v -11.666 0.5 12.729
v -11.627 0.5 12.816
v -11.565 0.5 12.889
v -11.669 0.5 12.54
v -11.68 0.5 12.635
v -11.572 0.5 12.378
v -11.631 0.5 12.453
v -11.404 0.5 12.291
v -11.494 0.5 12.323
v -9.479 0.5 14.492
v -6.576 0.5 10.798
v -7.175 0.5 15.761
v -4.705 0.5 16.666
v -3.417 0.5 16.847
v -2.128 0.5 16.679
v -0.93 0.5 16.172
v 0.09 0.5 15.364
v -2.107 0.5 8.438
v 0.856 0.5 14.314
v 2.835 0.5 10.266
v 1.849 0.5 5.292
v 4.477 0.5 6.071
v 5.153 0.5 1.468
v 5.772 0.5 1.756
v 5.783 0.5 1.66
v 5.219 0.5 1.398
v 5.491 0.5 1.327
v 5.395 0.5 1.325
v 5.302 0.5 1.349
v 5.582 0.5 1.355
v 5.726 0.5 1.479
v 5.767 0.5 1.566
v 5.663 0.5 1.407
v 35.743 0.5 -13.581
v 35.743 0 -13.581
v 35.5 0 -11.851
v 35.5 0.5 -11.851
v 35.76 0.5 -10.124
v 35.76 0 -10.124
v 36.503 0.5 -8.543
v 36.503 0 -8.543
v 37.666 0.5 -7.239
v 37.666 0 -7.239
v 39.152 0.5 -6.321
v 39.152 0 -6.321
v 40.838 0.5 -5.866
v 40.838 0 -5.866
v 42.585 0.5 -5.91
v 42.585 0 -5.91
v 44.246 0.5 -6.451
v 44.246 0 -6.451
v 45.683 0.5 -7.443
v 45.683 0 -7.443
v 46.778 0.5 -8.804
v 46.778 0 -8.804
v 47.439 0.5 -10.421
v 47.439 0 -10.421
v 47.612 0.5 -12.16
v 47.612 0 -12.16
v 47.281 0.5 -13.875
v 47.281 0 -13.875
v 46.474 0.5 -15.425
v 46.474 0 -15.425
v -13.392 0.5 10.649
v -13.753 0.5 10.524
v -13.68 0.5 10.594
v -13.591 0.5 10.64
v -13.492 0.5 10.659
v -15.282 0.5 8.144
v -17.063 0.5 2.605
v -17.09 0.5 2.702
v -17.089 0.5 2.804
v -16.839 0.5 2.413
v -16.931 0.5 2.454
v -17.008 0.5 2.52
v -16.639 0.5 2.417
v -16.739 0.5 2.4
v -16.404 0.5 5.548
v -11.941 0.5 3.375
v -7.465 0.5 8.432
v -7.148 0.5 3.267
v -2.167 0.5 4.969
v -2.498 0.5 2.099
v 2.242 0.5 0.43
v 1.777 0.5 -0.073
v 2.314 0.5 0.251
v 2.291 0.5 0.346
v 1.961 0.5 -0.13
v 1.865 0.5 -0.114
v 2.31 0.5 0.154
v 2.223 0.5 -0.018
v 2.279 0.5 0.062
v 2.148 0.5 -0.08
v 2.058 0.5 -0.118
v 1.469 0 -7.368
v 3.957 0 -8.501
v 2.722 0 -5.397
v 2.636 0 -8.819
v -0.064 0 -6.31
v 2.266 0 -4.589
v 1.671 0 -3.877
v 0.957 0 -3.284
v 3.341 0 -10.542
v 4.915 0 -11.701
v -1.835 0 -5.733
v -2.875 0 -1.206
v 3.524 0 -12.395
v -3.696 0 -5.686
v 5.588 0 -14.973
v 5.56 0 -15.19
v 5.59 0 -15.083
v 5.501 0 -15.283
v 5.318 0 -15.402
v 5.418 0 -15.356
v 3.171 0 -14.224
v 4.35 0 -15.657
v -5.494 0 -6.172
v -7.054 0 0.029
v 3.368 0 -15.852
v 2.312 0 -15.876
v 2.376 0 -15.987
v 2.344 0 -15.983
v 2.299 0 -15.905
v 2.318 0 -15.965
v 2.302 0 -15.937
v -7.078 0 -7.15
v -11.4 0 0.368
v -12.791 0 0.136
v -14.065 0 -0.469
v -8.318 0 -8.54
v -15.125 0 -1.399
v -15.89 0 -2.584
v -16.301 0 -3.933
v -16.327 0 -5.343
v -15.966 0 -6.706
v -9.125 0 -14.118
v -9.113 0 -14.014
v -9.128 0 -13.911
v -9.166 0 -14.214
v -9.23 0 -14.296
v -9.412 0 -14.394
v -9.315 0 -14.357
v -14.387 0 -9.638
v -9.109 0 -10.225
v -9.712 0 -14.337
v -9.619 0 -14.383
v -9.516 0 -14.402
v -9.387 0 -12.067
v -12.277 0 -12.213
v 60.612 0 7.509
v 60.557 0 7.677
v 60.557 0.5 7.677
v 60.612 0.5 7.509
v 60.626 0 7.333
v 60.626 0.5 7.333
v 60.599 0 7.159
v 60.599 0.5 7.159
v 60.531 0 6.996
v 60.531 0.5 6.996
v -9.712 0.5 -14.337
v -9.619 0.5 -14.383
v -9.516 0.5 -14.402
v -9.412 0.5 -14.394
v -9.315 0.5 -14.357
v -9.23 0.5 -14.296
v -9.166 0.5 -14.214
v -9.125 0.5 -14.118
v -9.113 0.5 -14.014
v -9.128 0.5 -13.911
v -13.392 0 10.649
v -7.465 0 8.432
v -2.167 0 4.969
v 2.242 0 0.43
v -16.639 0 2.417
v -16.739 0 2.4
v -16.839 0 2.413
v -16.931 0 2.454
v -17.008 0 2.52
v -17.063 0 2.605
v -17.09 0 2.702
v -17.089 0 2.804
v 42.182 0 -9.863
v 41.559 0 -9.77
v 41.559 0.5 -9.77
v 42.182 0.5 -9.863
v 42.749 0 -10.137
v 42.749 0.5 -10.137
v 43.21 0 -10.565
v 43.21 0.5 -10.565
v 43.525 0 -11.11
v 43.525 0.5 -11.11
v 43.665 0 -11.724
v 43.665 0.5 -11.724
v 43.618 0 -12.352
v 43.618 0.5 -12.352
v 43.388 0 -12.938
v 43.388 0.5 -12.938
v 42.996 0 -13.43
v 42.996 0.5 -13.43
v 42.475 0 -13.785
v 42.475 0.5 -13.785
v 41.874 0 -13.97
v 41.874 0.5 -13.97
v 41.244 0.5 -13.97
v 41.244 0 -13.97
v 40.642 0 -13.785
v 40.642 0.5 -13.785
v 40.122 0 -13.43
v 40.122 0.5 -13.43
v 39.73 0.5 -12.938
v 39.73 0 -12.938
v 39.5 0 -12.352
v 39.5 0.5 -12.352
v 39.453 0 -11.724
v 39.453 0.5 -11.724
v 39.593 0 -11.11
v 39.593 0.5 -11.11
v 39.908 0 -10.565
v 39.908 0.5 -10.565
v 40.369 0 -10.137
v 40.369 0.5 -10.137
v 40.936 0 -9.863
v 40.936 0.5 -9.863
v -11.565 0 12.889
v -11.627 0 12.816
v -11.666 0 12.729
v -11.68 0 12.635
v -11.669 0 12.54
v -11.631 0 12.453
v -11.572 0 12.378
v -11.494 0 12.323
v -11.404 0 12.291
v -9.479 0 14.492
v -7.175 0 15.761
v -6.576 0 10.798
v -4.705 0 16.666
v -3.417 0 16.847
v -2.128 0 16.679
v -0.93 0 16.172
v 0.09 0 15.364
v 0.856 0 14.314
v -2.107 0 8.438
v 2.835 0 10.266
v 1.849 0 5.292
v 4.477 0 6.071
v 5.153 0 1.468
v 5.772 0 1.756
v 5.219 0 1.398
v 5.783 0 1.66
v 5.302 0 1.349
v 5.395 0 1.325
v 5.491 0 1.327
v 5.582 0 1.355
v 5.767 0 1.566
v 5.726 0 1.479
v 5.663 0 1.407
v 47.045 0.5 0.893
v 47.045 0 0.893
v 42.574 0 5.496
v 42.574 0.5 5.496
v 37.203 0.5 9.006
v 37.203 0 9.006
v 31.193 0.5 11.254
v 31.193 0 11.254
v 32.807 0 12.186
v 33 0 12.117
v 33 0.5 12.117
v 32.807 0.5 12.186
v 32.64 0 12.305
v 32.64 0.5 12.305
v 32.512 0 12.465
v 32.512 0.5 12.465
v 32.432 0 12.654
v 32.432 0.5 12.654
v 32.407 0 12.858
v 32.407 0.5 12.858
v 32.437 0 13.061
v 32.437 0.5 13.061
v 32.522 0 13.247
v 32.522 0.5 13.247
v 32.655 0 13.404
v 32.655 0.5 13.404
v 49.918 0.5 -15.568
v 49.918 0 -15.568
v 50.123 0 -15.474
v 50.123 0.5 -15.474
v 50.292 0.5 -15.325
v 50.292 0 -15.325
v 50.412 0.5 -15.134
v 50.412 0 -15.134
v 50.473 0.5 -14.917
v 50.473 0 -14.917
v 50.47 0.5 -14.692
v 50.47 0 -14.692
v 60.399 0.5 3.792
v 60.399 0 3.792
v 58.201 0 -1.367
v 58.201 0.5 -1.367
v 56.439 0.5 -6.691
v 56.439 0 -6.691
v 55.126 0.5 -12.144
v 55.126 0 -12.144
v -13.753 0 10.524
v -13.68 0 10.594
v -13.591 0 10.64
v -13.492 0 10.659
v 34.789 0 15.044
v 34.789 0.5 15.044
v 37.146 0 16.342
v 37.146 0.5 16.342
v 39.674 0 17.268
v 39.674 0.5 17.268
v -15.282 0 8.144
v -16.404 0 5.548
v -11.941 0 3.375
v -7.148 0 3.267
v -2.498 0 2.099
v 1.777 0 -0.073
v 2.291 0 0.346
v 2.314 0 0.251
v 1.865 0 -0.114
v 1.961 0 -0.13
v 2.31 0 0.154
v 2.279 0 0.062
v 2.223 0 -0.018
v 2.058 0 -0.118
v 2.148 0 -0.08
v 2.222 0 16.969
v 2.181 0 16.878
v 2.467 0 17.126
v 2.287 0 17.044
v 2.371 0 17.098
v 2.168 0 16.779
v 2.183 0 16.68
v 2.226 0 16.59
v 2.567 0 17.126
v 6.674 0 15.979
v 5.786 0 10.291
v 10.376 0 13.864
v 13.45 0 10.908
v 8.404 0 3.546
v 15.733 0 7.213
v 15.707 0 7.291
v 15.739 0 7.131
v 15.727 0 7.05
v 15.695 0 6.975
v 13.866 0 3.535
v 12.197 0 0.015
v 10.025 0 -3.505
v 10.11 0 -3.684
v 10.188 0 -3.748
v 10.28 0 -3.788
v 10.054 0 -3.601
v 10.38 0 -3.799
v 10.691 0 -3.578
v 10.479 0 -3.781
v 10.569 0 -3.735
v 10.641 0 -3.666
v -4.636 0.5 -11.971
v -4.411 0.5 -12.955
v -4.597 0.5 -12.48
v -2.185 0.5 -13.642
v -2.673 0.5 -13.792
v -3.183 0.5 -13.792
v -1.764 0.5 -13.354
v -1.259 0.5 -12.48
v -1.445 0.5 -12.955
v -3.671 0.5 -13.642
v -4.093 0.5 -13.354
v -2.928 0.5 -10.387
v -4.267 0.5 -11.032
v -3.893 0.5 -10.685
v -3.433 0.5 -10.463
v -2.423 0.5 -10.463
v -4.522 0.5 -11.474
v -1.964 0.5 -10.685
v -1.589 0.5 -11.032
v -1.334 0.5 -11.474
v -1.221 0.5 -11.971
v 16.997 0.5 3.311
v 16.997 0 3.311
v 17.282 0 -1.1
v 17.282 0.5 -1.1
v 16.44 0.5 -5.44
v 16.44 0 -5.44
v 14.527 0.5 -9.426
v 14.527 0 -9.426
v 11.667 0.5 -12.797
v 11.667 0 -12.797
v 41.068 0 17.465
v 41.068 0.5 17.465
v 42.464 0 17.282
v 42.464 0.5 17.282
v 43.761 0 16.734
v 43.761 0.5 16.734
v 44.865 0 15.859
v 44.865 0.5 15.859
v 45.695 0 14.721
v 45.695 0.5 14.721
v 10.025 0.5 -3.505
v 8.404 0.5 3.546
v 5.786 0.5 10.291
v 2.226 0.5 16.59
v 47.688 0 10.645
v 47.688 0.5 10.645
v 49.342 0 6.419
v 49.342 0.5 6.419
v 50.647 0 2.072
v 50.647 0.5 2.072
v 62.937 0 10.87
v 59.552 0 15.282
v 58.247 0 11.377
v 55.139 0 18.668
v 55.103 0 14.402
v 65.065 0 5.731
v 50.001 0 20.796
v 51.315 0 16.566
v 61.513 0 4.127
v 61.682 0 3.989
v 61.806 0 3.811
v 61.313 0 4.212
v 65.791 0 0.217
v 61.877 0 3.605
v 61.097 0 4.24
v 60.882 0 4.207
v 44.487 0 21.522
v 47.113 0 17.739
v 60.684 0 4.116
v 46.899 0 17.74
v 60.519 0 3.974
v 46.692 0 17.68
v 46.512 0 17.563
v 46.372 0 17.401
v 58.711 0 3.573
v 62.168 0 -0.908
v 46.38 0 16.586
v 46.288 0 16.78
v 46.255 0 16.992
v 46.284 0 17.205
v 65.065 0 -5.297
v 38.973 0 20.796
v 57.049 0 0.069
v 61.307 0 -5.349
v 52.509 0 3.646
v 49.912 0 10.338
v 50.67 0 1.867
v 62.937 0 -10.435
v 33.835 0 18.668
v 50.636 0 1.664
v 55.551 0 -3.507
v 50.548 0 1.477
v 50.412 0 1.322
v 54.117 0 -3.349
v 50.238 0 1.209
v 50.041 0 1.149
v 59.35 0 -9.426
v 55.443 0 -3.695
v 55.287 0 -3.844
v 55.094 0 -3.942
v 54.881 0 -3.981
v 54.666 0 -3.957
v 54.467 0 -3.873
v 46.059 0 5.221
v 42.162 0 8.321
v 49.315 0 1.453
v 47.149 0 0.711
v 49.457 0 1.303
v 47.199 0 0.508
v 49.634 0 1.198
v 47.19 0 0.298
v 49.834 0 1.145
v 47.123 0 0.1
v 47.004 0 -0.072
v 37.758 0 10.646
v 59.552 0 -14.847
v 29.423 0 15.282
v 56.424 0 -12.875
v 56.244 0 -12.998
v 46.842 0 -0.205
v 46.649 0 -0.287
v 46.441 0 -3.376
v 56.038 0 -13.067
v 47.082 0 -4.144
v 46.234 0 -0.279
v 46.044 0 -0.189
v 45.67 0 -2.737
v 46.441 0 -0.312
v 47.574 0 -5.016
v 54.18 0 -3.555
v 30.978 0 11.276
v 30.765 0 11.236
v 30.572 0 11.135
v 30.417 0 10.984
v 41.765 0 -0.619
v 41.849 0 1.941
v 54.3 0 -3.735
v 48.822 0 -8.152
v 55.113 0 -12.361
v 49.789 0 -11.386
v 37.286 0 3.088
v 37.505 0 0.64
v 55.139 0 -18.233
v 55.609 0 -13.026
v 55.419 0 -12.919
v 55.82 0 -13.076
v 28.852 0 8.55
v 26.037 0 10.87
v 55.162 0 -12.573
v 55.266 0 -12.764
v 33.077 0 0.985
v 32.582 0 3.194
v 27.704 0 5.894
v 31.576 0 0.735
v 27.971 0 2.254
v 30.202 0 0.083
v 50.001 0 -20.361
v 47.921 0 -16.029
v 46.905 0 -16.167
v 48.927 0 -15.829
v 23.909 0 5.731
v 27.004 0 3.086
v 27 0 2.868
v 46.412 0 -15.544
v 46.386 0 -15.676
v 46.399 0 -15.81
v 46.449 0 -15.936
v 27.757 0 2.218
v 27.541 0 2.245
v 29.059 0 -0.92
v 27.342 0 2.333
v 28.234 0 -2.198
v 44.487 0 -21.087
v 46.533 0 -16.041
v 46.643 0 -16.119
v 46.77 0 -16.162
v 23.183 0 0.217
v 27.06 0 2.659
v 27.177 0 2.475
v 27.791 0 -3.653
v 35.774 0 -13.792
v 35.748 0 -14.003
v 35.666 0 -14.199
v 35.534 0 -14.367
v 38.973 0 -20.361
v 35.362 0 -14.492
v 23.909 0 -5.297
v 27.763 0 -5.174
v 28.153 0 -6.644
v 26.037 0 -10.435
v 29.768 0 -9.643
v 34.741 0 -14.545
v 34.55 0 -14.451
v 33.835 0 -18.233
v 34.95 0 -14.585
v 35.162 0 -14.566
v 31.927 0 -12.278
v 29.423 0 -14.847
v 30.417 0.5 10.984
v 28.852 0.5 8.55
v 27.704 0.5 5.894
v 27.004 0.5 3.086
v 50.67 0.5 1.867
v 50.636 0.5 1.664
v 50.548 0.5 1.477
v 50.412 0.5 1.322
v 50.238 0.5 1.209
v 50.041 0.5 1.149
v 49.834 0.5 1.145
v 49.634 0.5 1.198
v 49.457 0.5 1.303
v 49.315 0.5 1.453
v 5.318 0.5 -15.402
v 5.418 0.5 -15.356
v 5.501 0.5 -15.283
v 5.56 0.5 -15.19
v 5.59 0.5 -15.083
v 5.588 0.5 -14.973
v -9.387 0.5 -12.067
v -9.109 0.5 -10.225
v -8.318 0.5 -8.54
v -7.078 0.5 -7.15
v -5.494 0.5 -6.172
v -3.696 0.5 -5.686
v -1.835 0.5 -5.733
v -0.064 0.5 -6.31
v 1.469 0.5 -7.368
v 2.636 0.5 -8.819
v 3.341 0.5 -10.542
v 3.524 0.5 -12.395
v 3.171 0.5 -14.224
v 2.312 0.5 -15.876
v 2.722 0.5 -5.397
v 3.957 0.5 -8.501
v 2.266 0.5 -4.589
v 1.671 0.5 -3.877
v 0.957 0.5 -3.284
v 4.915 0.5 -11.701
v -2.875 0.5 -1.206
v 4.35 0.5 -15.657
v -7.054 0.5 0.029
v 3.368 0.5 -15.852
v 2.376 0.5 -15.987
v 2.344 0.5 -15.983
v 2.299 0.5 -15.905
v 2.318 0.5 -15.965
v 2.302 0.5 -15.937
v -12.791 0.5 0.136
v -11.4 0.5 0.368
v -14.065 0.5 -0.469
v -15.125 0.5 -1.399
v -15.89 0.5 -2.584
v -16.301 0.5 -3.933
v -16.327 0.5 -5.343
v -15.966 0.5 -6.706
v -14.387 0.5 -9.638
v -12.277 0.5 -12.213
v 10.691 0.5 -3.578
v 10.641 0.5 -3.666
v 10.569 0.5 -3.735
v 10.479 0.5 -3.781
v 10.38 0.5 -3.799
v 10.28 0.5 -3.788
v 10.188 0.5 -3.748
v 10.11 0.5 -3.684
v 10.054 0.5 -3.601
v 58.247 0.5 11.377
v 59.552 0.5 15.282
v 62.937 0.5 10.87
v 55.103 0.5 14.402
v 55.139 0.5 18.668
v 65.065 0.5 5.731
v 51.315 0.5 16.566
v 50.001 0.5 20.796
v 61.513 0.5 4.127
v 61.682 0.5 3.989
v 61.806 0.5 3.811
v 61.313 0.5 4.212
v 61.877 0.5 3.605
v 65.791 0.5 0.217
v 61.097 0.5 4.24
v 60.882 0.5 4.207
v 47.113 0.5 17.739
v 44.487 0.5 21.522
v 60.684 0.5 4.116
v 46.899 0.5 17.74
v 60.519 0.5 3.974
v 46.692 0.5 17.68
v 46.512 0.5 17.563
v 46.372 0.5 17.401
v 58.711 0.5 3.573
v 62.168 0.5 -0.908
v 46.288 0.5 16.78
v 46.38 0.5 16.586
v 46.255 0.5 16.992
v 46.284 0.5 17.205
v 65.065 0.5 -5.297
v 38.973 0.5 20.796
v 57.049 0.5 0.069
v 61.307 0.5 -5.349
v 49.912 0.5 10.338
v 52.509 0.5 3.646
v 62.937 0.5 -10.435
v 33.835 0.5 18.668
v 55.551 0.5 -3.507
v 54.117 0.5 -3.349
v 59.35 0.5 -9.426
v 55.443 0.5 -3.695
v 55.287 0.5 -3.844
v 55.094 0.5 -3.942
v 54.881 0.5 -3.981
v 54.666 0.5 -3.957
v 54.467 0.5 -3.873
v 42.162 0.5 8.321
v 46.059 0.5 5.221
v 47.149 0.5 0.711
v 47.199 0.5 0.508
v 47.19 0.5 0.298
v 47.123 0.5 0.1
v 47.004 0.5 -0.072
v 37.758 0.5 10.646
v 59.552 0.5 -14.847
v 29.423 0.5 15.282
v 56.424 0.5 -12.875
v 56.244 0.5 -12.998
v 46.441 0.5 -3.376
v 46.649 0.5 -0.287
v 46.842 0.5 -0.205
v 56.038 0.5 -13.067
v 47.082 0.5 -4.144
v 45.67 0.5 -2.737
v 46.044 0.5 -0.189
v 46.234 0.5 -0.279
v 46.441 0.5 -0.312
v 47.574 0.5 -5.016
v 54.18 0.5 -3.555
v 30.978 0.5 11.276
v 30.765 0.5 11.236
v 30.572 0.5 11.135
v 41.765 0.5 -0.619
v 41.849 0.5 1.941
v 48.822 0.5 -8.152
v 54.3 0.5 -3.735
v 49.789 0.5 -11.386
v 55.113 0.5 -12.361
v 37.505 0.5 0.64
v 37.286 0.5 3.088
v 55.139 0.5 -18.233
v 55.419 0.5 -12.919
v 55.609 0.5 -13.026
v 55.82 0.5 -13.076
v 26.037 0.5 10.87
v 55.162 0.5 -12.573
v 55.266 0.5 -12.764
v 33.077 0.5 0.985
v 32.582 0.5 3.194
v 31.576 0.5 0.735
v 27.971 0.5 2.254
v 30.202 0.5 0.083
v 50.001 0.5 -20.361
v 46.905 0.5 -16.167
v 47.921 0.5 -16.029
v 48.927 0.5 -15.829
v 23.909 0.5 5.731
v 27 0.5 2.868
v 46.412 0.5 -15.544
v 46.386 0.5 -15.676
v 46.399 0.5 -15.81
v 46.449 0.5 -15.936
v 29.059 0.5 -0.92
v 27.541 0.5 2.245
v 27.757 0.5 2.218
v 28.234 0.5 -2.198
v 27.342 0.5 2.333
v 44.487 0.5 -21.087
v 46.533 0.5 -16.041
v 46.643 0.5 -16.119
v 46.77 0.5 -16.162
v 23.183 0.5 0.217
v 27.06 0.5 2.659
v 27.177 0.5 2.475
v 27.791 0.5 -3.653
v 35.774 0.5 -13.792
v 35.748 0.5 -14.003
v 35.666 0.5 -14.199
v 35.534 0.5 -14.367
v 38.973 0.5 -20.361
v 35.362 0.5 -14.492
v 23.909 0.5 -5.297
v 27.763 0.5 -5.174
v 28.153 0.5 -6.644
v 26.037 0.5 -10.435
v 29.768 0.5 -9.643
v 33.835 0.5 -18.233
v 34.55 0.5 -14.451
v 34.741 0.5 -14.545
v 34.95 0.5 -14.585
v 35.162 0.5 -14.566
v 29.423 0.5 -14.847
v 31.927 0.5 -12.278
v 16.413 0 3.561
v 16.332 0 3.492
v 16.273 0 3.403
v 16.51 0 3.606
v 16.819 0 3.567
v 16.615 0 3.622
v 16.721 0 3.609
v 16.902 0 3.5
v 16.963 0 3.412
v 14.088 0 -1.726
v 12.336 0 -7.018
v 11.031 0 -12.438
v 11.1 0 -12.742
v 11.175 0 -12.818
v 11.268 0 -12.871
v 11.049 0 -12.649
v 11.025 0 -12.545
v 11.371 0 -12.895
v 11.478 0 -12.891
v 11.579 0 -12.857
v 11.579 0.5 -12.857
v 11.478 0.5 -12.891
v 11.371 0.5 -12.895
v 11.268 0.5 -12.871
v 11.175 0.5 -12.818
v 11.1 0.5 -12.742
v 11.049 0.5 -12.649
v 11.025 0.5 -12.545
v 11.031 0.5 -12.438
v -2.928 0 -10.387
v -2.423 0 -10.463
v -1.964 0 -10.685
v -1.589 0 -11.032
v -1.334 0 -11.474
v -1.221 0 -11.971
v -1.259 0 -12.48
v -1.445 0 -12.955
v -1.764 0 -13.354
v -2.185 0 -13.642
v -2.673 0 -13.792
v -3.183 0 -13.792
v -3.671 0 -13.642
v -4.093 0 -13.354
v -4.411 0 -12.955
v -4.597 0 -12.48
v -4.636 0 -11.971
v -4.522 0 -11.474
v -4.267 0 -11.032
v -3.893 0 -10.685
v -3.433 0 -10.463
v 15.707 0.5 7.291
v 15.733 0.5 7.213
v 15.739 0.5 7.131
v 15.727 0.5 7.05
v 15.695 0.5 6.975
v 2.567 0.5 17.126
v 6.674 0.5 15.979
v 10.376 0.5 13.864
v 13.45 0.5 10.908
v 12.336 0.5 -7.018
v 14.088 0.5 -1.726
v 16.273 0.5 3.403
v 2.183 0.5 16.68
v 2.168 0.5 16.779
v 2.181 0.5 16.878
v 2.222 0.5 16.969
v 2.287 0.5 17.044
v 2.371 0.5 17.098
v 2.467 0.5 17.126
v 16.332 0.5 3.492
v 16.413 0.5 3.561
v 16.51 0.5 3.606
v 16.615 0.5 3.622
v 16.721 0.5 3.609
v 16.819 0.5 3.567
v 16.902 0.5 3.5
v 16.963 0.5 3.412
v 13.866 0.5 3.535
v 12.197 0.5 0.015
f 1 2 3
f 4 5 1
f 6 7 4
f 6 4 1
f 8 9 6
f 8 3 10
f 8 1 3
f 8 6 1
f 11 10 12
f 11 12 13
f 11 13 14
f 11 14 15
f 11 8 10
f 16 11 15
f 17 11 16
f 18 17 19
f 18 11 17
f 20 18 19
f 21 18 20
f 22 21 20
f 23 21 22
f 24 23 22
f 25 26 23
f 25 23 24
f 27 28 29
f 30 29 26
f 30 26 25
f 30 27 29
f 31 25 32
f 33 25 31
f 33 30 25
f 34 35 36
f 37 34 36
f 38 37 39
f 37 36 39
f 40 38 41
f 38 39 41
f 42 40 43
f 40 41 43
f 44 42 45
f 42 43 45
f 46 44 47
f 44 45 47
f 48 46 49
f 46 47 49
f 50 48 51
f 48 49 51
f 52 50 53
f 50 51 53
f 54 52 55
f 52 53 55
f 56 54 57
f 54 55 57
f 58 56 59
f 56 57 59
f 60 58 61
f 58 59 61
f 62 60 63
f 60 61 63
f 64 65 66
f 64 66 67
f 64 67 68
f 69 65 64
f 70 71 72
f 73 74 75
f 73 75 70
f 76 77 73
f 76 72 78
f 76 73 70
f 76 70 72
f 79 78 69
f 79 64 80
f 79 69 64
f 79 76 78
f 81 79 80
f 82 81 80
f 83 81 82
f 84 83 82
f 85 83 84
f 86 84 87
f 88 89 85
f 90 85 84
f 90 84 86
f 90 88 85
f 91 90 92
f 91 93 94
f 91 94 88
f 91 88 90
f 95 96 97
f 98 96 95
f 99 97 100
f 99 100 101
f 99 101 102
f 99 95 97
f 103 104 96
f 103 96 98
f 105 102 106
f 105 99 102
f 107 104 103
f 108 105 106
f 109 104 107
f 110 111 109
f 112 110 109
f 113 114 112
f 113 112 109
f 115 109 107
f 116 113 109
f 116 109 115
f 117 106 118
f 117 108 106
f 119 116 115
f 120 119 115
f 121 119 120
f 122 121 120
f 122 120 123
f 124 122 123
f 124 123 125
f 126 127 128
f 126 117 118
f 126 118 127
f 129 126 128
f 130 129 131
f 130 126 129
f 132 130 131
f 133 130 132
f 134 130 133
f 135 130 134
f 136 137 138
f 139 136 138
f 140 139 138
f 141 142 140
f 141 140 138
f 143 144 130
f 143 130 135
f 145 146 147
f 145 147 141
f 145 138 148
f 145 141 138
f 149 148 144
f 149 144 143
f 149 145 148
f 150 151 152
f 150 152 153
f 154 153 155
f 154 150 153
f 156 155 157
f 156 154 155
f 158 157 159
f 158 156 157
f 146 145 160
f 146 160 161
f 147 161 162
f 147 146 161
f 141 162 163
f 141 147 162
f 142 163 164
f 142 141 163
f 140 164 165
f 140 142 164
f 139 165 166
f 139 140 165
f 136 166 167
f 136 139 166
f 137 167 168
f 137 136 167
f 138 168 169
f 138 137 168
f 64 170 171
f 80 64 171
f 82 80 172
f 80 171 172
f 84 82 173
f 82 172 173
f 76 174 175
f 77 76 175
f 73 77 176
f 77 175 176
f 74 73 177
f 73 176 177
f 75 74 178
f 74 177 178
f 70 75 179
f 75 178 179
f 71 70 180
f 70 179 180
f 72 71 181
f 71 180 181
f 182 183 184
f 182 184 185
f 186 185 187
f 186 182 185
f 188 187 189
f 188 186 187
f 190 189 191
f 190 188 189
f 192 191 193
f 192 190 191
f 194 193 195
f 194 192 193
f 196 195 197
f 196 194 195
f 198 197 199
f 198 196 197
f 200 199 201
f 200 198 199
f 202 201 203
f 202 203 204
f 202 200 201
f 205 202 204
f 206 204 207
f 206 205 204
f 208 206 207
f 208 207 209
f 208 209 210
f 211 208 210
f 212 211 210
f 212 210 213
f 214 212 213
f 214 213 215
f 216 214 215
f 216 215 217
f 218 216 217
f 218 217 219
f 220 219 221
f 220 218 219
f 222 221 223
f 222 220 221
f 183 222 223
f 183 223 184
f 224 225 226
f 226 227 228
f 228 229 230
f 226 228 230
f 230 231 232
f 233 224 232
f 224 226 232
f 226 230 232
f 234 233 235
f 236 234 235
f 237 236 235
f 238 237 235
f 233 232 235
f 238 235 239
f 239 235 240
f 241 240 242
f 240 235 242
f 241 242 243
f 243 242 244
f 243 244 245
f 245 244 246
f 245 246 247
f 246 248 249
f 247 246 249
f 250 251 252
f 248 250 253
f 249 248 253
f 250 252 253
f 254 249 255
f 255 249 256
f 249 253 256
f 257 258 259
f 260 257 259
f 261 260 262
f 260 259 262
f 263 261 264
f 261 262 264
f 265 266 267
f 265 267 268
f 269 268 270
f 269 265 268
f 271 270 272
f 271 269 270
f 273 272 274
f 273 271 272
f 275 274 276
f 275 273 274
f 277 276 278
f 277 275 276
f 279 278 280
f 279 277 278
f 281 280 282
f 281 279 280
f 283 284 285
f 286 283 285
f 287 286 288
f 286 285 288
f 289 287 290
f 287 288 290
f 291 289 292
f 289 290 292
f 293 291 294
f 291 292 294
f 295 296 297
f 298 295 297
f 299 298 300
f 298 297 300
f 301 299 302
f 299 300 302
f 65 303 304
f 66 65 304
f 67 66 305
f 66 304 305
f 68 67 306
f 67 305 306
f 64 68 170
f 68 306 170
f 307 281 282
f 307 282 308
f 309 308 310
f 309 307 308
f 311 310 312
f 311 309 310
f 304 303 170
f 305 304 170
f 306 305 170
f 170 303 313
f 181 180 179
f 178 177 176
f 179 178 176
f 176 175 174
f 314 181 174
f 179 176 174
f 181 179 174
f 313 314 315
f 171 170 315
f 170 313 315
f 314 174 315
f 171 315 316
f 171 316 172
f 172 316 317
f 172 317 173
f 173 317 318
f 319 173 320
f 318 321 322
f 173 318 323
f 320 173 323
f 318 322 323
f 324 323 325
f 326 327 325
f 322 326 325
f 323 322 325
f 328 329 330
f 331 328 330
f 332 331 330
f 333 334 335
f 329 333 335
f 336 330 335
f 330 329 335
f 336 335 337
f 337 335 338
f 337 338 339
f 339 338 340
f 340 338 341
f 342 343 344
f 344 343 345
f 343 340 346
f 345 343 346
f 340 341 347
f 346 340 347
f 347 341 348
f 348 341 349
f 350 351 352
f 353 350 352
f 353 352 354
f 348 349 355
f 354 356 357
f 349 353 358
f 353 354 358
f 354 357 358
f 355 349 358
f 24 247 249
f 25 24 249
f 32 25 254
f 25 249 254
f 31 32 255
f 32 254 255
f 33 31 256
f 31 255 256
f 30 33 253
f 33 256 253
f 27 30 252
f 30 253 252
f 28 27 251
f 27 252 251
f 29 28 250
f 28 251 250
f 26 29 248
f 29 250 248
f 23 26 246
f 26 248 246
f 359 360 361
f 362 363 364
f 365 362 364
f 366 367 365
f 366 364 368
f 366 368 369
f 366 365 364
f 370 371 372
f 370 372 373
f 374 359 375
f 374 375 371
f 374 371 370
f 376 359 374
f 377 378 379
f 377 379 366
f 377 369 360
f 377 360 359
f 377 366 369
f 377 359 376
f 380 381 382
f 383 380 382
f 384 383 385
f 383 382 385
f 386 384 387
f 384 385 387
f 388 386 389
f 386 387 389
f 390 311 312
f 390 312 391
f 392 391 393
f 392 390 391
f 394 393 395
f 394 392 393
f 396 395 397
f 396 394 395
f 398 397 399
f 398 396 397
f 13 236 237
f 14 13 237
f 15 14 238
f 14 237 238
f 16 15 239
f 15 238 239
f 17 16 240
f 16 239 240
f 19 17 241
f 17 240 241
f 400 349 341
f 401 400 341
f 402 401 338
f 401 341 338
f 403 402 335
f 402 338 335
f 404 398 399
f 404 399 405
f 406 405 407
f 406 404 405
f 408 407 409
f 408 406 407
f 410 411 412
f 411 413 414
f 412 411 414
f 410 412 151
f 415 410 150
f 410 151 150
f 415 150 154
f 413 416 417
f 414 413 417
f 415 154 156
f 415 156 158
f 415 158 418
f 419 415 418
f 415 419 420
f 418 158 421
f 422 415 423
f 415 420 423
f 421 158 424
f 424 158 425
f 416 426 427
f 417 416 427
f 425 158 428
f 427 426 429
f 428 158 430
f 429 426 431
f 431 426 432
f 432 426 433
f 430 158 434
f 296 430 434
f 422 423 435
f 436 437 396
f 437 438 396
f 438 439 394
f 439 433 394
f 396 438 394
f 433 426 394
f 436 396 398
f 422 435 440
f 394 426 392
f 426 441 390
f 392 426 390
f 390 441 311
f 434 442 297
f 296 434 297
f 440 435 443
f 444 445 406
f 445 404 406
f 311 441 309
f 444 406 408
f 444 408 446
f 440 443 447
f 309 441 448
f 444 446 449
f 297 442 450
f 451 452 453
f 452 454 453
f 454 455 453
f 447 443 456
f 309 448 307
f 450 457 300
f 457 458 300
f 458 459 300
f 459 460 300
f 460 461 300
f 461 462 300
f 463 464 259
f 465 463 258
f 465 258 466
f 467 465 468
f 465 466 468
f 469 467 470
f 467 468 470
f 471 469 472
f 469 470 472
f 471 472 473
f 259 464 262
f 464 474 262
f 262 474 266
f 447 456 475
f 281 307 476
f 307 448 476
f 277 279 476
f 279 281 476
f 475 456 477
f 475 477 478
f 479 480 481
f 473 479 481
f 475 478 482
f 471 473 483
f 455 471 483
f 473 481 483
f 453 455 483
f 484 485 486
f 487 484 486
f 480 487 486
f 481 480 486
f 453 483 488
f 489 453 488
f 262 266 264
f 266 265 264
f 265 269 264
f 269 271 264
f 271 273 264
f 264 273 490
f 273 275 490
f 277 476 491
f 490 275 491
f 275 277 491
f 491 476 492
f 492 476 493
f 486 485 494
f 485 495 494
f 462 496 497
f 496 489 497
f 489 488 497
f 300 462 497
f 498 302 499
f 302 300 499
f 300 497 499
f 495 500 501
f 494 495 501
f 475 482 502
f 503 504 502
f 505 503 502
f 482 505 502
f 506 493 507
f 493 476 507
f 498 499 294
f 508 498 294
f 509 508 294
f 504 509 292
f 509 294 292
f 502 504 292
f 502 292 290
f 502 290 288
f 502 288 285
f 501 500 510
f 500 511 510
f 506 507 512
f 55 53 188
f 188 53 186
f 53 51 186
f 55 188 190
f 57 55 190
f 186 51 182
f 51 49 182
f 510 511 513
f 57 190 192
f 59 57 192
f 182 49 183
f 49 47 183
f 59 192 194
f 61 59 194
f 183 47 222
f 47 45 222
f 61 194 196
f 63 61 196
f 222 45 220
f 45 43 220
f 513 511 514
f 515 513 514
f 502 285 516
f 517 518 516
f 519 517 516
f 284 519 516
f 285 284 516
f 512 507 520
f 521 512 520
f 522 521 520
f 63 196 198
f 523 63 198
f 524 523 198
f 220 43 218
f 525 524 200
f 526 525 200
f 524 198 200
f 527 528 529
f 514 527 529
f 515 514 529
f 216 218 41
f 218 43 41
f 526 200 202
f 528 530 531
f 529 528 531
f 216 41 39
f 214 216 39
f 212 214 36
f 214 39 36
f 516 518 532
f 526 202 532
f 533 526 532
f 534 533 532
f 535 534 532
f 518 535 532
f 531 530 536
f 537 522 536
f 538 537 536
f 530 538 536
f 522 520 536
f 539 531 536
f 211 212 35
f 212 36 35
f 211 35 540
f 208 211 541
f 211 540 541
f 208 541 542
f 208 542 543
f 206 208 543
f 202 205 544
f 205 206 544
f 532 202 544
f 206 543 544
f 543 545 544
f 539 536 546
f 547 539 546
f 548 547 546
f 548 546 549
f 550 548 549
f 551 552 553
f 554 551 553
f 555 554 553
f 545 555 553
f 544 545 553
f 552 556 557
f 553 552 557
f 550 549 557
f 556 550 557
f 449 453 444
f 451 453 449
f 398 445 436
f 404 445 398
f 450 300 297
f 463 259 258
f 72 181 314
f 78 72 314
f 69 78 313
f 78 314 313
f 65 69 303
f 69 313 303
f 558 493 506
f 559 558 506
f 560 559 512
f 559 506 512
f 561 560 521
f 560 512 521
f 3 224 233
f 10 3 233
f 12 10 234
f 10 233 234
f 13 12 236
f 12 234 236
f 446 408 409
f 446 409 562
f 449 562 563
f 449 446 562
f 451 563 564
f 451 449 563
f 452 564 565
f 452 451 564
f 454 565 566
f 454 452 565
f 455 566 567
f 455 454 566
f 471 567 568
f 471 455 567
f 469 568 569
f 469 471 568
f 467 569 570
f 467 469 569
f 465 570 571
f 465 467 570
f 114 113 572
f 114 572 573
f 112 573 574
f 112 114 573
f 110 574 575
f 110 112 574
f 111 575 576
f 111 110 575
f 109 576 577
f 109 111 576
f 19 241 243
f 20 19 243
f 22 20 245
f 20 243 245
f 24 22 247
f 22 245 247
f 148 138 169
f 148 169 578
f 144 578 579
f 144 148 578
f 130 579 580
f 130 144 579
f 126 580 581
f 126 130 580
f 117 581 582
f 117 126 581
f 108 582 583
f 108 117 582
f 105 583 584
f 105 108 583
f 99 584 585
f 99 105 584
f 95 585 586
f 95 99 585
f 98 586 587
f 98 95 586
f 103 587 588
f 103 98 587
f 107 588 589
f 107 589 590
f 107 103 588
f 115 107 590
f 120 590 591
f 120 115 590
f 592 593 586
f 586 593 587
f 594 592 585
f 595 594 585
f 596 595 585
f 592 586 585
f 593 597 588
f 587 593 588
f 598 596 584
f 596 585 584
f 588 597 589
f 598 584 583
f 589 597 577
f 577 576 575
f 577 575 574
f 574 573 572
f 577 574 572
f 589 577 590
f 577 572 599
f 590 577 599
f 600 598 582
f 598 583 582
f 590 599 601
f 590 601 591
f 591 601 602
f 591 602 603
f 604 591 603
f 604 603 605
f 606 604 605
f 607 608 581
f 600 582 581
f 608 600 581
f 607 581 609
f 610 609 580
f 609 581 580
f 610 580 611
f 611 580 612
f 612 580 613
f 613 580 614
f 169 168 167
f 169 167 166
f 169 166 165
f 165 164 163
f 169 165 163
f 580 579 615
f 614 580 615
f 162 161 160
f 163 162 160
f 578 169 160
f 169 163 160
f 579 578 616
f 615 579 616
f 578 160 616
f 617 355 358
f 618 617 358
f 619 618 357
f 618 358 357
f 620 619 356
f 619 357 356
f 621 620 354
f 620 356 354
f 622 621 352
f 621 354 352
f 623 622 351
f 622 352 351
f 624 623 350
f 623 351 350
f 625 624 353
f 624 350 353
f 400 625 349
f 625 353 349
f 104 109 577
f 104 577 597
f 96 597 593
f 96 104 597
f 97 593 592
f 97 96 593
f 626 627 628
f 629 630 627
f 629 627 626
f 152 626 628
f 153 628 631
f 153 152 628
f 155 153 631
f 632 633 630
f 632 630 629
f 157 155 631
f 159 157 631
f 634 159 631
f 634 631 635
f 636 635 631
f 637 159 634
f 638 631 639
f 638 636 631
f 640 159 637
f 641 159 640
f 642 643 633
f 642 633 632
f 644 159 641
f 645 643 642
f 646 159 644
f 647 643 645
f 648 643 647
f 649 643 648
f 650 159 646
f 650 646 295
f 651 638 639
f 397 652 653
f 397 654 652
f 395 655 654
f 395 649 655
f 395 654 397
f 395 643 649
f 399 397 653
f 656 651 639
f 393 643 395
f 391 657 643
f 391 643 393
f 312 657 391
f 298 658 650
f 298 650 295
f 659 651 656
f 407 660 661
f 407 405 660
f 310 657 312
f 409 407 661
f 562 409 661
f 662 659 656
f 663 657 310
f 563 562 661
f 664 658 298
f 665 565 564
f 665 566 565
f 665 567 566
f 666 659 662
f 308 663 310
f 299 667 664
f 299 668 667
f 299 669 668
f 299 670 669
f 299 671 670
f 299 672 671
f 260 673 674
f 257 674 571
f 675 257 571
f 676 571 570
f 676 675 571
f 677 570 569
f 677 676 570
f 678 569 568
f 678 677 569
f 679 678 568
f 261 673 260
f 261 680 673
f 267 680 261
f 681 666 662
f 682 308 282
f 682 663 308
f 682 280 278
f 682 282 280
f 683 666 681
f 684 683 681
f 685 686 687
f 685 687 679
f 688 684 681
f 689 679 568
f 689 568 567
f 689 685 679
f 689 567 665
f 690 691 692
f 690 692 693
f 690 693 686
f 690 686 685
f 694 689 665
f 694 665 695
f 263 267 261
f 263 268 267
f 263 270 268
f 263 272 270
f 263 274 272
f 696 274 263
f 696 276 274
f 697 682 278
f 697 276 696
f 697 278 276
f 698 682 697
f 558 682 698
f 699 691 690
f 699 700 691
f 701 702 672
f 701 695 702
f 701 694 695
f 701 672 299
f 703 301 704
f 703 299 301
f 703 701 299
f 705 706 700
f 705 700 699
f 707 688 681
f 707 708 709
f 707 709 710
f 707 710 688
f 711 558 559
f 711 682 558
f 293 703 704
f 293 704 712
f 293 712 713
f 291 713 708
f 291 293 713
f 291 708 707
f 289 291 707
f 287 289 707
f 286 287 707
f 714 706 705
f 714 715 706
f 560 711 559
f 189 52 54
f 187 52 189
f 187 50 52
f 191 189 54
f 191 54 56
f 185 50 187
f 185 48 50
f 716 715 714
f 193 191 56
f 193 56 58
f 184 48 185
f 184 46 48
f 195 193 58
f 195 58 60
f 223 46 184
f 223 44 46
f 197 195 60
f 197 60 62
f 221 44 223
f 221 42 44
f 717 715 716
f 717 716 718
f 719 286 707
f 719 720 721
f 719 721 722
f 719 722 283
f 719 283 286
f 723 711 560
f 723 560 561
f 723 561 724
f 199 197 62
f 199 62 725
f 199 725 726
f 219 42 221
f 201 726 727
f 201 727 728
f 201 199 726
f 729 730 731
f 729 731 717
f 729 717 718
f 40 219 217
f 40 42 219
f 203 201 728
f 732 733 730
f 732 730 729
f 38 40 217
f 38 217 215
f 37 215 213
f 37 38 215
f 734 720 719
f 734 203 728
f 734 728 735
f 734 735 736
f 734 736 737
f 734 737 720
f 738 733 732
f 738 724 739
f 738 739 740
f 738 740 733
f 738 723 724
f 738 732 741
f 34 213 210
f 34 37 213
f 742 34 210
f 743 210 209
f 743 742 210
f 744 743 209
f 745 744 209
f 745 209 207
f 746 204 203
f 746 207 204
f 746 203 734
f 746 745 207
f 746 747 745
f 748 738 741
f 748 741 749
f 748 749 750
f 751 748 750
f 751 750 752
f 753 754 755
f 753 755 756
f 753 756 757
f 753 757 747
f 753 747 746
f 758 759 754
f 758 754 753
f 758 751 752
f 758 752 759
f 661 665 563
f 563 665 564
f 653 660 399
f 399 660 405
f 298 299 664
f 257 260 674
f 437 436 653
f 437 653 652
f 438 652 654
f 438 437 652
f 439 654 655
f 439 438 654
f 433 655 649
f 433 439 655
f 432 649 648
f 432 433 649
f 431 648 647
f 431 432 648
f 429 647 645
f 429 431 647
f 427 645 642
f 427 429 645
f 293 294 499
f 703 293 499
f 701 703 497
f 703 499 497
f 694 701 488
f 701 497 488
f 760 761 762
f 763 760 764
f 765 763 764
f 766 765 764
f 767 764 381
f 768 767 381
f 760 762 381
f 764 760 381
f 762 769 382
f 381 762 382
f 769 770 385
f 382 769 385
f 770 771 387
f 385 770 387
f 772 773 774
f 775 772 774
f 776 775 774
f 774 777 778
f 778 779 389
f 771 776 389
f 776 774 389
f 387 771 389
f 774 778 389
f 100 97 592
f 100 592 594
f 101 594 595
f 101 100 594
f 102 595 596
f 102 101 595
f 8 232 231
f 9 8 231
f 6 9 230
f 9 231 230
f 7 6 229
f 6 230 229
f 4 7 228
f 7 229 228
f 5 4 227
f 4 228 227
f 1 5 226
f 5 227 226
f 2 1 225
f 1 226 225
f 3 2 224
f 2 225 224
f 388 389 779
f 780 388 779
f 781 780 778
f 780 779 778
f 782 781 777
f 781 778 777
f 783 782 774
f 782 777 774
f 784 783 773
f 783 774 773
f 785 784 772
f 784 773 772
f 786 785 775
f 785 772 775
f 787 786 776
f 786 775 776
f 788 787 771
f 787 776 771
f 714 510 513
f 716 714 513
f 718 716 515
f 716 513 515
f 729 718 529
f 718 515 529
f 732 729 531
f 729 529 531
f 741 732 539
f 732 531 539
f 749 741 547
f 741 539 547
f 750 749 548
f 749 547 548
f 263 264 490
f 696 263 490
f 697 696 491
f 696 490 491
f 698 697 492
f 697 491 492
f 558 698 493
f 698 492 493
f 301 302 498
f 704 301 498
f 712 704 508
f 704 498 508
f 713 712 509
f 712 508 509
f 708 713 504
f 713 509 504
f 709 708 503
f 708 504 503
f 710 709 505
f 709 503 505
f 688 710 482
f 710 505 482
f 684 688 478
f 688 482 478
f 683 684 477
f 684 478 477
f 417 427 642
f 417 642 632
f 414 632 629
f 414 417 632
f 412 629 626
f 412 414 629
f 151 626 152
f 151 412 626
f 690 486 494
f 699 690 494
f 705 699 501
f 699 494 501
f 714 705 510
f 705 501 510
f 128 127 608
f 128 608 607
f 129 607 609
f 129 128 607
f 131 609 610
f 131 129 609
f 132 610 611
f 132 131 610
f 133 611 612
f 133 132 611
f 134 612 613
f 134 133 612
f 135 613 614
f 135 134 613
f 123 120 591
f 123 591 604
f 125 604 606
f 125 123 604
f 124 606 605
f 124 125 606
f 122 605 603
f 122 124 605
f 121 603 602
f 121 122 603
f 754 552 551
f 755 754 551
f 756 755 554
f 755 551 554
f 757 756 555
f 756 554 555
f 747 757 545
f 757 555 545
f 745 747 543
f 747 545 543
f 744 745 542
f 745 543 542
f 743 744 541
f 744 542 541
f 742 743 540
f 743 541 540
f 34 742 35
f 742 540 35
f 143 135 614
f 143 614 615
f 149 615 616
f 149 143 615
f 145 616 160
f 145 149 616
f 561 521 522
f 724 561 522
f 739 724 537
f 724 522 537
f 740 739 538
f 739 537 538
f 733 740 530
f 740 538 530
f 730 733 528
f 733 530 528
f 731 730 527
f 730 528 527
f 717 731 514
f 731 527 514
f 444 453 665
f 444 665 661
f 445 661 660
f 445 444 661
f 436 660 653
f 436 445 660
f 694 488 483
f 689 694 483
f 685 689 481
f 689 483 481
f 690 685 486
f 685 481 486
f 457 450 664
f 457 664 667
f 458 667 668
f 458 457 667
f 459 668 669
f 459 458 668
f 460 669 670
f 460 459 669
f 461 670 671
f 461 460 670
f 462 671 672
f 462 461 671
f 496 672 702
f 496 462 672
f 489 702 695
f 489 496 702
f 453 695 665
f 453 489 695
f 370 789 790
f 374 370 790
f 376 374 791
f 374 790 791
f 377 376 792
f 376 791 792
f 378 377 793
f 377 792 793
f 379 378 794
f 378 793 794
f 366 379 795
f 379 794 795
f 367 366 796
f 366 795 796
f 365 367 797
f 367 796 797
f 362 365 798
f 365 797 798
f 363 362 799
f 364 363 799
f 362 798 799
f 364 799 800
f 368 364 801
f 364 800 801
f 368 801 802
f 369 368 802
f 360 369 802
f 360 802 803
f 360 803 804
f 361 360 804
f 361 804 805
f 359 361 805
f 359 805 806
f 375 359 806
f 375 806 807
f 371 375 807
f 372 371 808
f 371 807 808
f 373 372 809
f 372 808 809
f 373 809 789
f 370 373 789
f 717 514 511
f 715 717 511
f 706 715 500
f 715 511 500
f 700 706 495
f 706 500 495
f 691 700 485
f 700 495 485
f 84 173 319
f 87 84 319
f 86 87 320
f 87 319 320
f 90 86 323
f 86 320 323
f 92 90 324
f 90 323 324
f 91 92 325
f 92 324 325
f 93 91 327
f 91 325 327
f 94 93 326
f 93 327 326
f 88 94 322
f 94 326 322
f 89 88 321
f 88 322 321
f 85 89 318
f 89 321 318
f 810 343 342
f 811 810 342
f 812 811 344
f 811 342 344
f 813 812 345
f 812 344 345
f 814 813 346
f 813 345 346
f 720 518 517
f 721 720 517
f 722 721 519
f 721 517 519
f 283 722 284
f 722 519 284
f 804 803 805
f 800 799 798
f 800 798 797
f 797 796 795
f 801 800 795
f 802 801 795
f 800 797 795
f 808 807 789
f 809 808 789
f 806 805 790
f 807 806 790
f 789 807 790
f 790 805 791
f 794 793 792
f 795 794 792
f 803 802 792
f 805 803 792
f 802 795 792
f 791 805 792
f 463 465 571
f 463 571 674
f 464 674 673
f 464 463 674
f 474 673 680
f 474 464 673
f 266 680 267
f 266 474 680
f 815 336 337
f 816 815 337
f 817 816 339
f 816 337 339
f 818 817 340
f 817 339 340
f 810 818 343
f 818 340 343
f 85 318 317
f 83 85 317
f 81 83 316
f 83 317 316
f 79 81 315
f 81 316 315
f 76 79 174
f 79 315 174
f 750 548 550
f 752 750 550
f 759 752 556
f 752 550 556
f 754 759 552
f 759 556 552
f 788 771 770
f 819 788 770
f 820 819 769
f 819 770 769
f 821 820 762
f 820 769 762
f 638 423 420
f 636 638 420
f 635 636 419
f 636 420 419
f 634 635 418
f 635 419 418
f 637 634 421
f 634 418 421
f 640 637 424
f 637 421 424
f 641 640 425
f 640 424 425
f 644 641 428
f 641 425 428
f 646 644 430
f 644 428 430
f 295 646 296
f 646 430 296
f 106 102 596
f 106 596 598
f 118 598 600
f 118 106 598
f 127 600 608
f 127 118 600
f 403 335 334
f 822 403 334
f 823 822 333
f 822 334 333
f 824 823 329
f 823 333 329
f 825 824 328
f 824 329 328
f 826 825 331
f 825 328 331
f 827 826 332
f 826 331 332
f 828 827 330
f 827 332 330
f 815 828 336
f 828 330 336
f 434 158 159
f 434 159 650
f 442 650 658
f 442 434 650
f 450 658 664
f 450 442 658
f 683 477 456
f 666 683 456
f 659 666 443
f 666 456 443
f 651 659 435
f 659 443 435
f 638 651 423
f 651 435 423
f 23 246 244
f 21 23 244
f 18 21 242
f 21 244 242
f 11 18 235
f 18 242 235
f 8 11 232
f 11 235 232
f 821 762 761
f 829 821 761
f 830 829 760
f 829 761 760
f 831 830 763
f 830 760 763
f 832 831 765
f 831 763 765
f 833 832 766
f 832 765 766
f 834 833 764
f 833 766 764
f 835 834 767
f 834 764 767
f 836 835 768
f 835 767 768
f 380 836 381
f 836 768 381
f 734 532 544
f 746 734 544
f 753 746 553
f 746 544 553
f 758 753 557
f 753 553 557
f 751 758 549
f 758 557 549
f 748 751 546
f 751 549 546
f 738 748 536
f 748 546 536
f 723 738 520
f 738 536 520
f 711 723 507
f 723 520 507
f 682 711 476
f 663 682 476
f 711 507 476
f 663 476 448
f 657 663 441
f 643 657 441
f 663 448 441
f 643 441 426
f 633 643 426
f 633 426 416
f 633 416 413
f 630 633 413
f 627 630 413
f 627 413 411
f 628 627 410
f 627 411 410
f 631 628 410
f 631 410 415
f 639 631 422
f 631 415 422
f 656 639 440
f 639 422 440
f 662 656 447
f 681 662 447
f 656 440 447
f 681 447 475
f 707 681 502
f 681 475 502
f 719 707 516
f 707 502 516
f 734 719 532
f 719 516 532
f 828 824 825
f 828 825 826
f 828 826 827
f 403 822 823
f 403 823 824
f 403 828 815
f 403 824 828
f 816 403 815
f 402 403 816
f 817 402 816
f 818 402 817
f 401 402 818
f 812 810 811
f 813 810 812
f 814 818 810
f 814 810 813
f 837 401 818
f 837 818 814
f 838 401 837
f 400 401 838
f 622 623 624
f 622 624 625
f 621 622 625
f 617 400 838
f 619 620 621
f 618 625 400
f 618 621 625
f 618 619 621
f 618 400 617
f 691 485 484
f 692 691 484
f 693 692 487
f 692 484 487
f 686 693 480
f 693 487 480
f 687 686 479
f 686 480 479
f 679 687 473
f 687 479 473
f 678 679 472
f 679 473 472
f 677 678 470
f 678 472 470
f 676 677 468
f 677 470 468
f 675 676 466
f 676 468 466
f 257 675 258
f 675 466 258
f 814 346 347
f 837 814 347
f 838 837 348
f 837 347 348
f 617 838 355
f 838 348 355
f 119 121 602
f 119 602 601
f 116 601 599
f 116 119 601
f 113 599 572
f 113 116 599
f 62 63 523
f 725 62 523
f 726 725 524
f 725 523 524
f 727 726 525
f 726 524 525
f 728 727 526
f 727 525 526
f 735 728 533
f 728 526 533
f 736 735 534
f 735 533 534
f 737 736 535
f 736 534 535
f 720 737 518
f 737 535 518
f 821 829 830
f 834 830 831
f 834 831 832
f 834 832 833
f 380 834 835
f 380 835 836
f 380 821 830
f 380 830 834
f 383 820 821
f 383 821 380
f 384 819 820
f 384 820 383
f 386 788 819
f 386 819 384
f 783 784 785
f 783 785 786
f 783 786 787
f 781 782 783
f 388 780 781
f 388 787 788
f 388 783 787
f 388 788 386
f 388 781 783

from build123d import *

# Parameters (mm, degrees)
SKETCH1_R             = 21.304347825
SKETCH1_R_2           = 2.112216788
BOSS_EXTRUDE1_DEPTH   = 0.5
SKETCH1_R_3           = 1.712216788
BOSS_EXTRUDE1_2_DEPTH = 0.5
BOSS_EXTRUDE1_3_DEPTH = 0.5
BOSS_EXTRUDE1_4_DEPTH = 0.5
BOSS_EXTRUDE1_5_DEPTH = 0.5
BOSS_EXTRUDE1_6_DEPTH = 0.5
BOSS_EXTRUDE1_7_DEPTH = 0.5


with BuildPart() as part:
    # Sketch1 → Boss-Extrude1 (new body)
    with BuildSketch(Plane(origin=(0, 0, 0), x_dir=(1, 0, 0), z_dir=(0, 1, 0))):
        with Locations(Location((44.487062997, -0.21741061, 0), (0, 0, 90))):
            Circle(SKETCH1_R)
        with Locations(Location((41.558946189, 11.881816638, 0), (0, 0, 270))):
            Circle(SKETCH1_R_2, mode=Mode.SUBTRACT)
        with BuildLine():
            ThreePointArc((39.673526788, -17.26792982), (43.131364778, -17.051633854), (45.695197803, -14.721357534))
            ThreePointArc((45.695197803, -14.721357534), (48.558363163, -8.54854891), (50.646909198, -2.072496282))
            ThreePointArc((50.646909198, -2.072496282), (50.238084471, -1.209442528), (49.314698472, -1.453076963))
            ThreePointArc((49.314698472, -1.453076963), (42.161553817, -8.3207717), (33.000497038, -12.116525664))
            ThreePointArc((33.000497038, -12.116525664), (32.432151651, -12.654100691), (32.654790326, -13.404057629))
            ThreePointArc((32.654790326, -13.404057629), (35.942876939, -15.737952507), (39.673526788, -17.26792982))
        make_face(mode=Mode.SUBTRACT)
        with BuildLine():
            ThreePointArc((56.423543694, 12.874982783), (61.307004643, 5.348548355), (61.877086439, -3.605244851))
            ThreePointArc((61.877086439, -3.605244851), (61.205780047, -4.233397155), (60.399042663, -3.792486299))
            ThreePointArc((60.399042663, -3.792486299), (57.264233589, 4.010737662), (55.125564527, 12.143598583))
            ThreePointArc((55.125564527, 12.143598583), (55.510050475, 12.978702256), (56.423543694, 12.874982783))
        make_face(mode=Mode.SUBTRACT)
        with BuildLine():
            ThreePointArc((35.74306904, 13.58123778), (42.584701249, 5.910193259), (46.474366925, 15.424569553))
            ThreePointArc((46.474366925, 15.424569553), (46.449049576, 15.935533661), (46.905099323, 16.167361001))
            ThreePointArc((46.905099323, 16.167361001), (48.425339038, 15.936857925), (49.918144326, 15.568357139))
            ThreePointArc((49.918144326, 15.568357139), (50.359254089, 15.234200839), (50.469975713, 14.692002558))
            ThreePointArc((50.469975713, 14.692002558), (49.341079976, 9.758502022), (47.573967467, 5.016018864))
            ThreePointArc((47.573967467, 5.016018864), (46.778881813, 3.745551568), (45.670393621, 2.736838391))
            ThreePointArc((45.670393621, 2.736838391), (39.668336878, -0.122026225), (33.076504218, -0.985469451))
            ThreePointArc((33.076504218, -0.985469451), (28.602377258, 1.530626264), (28.152690377, 6.64397462))
            ThreePointArc((28.152690377, 6.64397462), (30.783805242, 11.012507603), (34.550280043, 14.450604958))
            ThreePointArc((34.550280043, 14.450604958), (35.452186805, 14.435090248), (35.74306904, 13.58123778))
        make_face(mode=Mode.SUBTRACT)
        with BuildLine():
            ThreePointArc((46.04448921, 0.18947378), (47.003905166, 0.072394105), (47.045268493, -0.89325371))
            ThreePointArc((47.045268493, -0.89325371), (39.985712078, -7.399346097), (31.193373212, -11.254388531))
            ThreePointArc((31.193373212, -11.254388531), (30.764585044, -11.23560468), (30.416859282, -10.984011912))
            ThreePointArc((30.416859282, -10.984011912), (28.223590637, -7.245198523), (27.003836731, -3.085708973))
            ThreePointArc((27.003836731, -3.085708973), (27.254060539, -2.398116018), (27.971395863, -2.253803647))
            ThreePointArc((27.971395863, -2.253803647), (37.285921037, -3.088391272), (46.04448921, 0.18947378))
        make_face(mode=Mode.SUBTRACT)
        with BuildLine():
            ThreePointArc((55.550587305, 3.507035985), (54.772891569, 3.976842729), (54.116521674, 3.348585143))
            ThreePointArc((54.116521674, 3.348585143), (51.330970772, -7.038880469), (46.380123031, -16.586018381))
            ThreePointArc((46.380123031, -16.586018381), (46.371937467, -17.400676251), (47.113228794, -17.73864314))
            ThreePointArc((47.113228794, -17.73864314), (55.103018102, -14.401621317), (60.557195292, -7.676712468))
            ThreePointArc((60.557195292, -7.676712468), (60.626099076, -7.33330644), (60.530956972, -6.996225721))
            ThreePointArc((60.530956972, -6.996225721), (57.859832456, -1.830391693), (55.550587305, 3.507035985))
        make_face(mode=Mode.SUBTRACT)
    extrude(amount=BOSS_EXTRUDE1_DEPTH)


with BuildPart() as body_2:
    # Sketch1 → Boss-Extrude1 2 (new body)
    with BuildSketch(Plane(origin=(0, 0, 0), x_dir=(1, 0, 0), z_dir=(0, 1, 0))):
        with Locations(Location((-2.928116808, 12.099227248, 0), (0, 0, 270))):
            Circle(SKETCH1_R_3)
    extrude(amount=BOSS_EXTRUDE1_2_DEPTH)


with BuildPart() as body_3:
    # Sketch1 → Boss-Extrude1 3 (new body)
    with BuildSketch(Plane(origin=(0, 0, 0), x_dir=(1, 0, 0), z_dir=(0, 1, 0))):
        with BuildLine():
            ThreePointArc((-11.399803254, -0.368203468), (-15.548599028, 1.964937134), (-15.965587426, 6.706474028))
            ThreePointArc((-15.965587426, 6.706474028), (-13.393875896, 10.976377555), (-9.712437733, 14.336852131))
            ThreePointArc((-9.712437733, 14.336852131), (-9.270478736, 14.329249499), (-9.12793848, 13.910838421))
            ThreePointArc((-9.12793848, 13.910838421), (-1.834644871, 5.733377507), (2.311803366, 15.875860718))
            ThreePointArc((2.311803366, 15.875860718), (2.30801657, 15.952287238), (2.376229375, 15.986962387))
            ThreePointArc((2.376229375, 15.986962387), (3.860281002, 15.761946252), (5.317551256, 15.402217331))
            ThreePointArc((5.317551256, 15.402217331), (5.533707112, 15.2384716), (5.587963738, 14.972779603))
            ThreePointArc((5.587963738, 14.972779603), (4.470812566, 10.090605171), (2.722084367, 5.397460851))
            ThreePointArc((2.722084367, 5.397460851), (1.984812486, 4.219374177), (0.956926784, 3.284008461))
            ThreePointArc((0.956926784, 3.284008461), (-4.932103401, 0.478979995), (-11.399803254, -0.368203468))
        make_face()
    extrude(amount=BOSS_EXTRUDE1_3_DEPTH)


with BuildPart() as body_4:
    # Sketch1 → Boss-Extrude1 4 (new body)
    with BuildSketch(Plane(origin=(0, 0, 0), x_dir=(1, 0, 0), z_dir=(0, 1, 0))):
        with BuildLine():
            ThreePointArc((1.777253093, 0.072704584), (-7.147553962, -3.267374817), (-16.638870162, -2.4169466))
            ThreePointArc((-16.638870162, -2.4169466), (-16.972221986, -2.484009785), (-17.088503117, -2.803540078))
            ThreePointArc((-17.088503117, -2.803540078), (-15.896287899, -6.869119797), (-13.752537225, -10.523521066))
            ThreePointArc((-13.752537225, -10.523521066), (-13.590946107, -10.640438364), (-13.3916846, -10.64916738))
            ThreePointArc((-13.3916846, -10.64916738), (-4.720197899, -6.847113147), (2.242323735, -0.430448086))
            ThreePointArc((2.242323735, -0.430448086), (2.223101845, 0.018296664), (1.777253093, 0.072704584))
        make_face()
    extrude(amount=BOSS_EXTRUDE1_4_DEPTH)


with BuildPart() as body_5:
    # Sketch1 → Boss-Extrude1 5 (new body)
    with BuildSketch(Plane(origin=(0, 0, 0), x_dir=(1, 0, 0), z_dir=(0, 1, 0))):
        with BuildLine():
            ThreePointArc((5.153271658, -1.467961589), (-2.106660176, -8.438182107), (-11.404479659, -12.290601758))
            ThreePointArc((-11.404479659, -12.290601758), (-11.668594592, -12.540417444), (-11.565132507, -12.888928809))
            ThreePointArc((-11.565132507, -12.888928809), (-8.351281844, -15.170130761), (-4.704859805, -16.665565396))
            ThreePointArc((-4.704859805, -16.665565396), (-1.511499324, -16.465813125), (0.856235395, -14.313771205))
            ThreePointArc((0.856235395, -14.313771205), (3.698824612, -8.185323479), (5.772361309, -1.755811013))
            ThreePointArc((5.772361309, -1.755811013), (5.582376982, -1.354742596), (5.153271658, -1.467961589))
        make_face()
    extrude(amount=BOSS_EXTRUDE1_5_DEPTH)


with BuildPart() as body_6:
    # Sketch1 → Boss-Extrude1 6 (new body)
    with BuildSketch(Plane(origin=(0, 0, 0), x_dir=(1, 0, 0), z_dir=(0, 1, 0))):
        with BuildLine():
            ThreePointArc((10.024736828, 3.504716203), (7.216810324, -6.966189204), (2.226193717, -16.590016779))
            ThreePointArc((2.226193717, -16.590016779), (2.222389816, -16.968595218), (2.566874198, -17.125651304))
            ThreePointArc((2.566874198, -17.125651304), (10.376276046, -13.863970253), (15.70731292, -7.290891344))
            ThreePointArc((15.70731292, -7.290891344), (15.739333094, -7.131307643), (15.69511975, -6.974663367))
            ThreePointArc((15.69511975, -6.974663367), (13.011342786, -1.784360079), (10.691159319, 3.578349656))
            ThreePointArc((10.691159319, 3.578349656), (10.329757499, 3.796672844), (10.024736828, 3.504716203))
        make_face()
    extrude(amount=BOSS_EXTRUDE1_6_DEPTH)


with BuildPart() as body_7:
    # Sketch1 → Boss-Extrude1 7 (new body)
    with BuildSketch(Plane(origin=(0, 0, 0), x_dir=(1, 0, 0), z_dir=(0, 1, 0))):
        with BuildLine():
            ThreePointArc((11.030942488, 12.438404895), (13.156918599, 4.353812312), (16.273122655, -3.403099698))
            ThreePointArc((16.273122655, -3.403099698), (16.668446052, -3.619158085), (16.997404557, -3.311346265))
            ThreePointArc((16.997404557, -3.311346265), (16.440193639, 5.440294925), (11.666987802, 12.79680317))
            ThreePointArc((11.666987802, 12.79680317), (11.219351125, 12.84762855), (11.030942488, 12.438404895))
        make_face()
    extrude(amount=BOSS_EXTRUDE1_7_DEPTH)


solid = Compound([part.part, body_2.part, body_3.part, body_4.part, body_5.part, body_6.part, body_7.part])
